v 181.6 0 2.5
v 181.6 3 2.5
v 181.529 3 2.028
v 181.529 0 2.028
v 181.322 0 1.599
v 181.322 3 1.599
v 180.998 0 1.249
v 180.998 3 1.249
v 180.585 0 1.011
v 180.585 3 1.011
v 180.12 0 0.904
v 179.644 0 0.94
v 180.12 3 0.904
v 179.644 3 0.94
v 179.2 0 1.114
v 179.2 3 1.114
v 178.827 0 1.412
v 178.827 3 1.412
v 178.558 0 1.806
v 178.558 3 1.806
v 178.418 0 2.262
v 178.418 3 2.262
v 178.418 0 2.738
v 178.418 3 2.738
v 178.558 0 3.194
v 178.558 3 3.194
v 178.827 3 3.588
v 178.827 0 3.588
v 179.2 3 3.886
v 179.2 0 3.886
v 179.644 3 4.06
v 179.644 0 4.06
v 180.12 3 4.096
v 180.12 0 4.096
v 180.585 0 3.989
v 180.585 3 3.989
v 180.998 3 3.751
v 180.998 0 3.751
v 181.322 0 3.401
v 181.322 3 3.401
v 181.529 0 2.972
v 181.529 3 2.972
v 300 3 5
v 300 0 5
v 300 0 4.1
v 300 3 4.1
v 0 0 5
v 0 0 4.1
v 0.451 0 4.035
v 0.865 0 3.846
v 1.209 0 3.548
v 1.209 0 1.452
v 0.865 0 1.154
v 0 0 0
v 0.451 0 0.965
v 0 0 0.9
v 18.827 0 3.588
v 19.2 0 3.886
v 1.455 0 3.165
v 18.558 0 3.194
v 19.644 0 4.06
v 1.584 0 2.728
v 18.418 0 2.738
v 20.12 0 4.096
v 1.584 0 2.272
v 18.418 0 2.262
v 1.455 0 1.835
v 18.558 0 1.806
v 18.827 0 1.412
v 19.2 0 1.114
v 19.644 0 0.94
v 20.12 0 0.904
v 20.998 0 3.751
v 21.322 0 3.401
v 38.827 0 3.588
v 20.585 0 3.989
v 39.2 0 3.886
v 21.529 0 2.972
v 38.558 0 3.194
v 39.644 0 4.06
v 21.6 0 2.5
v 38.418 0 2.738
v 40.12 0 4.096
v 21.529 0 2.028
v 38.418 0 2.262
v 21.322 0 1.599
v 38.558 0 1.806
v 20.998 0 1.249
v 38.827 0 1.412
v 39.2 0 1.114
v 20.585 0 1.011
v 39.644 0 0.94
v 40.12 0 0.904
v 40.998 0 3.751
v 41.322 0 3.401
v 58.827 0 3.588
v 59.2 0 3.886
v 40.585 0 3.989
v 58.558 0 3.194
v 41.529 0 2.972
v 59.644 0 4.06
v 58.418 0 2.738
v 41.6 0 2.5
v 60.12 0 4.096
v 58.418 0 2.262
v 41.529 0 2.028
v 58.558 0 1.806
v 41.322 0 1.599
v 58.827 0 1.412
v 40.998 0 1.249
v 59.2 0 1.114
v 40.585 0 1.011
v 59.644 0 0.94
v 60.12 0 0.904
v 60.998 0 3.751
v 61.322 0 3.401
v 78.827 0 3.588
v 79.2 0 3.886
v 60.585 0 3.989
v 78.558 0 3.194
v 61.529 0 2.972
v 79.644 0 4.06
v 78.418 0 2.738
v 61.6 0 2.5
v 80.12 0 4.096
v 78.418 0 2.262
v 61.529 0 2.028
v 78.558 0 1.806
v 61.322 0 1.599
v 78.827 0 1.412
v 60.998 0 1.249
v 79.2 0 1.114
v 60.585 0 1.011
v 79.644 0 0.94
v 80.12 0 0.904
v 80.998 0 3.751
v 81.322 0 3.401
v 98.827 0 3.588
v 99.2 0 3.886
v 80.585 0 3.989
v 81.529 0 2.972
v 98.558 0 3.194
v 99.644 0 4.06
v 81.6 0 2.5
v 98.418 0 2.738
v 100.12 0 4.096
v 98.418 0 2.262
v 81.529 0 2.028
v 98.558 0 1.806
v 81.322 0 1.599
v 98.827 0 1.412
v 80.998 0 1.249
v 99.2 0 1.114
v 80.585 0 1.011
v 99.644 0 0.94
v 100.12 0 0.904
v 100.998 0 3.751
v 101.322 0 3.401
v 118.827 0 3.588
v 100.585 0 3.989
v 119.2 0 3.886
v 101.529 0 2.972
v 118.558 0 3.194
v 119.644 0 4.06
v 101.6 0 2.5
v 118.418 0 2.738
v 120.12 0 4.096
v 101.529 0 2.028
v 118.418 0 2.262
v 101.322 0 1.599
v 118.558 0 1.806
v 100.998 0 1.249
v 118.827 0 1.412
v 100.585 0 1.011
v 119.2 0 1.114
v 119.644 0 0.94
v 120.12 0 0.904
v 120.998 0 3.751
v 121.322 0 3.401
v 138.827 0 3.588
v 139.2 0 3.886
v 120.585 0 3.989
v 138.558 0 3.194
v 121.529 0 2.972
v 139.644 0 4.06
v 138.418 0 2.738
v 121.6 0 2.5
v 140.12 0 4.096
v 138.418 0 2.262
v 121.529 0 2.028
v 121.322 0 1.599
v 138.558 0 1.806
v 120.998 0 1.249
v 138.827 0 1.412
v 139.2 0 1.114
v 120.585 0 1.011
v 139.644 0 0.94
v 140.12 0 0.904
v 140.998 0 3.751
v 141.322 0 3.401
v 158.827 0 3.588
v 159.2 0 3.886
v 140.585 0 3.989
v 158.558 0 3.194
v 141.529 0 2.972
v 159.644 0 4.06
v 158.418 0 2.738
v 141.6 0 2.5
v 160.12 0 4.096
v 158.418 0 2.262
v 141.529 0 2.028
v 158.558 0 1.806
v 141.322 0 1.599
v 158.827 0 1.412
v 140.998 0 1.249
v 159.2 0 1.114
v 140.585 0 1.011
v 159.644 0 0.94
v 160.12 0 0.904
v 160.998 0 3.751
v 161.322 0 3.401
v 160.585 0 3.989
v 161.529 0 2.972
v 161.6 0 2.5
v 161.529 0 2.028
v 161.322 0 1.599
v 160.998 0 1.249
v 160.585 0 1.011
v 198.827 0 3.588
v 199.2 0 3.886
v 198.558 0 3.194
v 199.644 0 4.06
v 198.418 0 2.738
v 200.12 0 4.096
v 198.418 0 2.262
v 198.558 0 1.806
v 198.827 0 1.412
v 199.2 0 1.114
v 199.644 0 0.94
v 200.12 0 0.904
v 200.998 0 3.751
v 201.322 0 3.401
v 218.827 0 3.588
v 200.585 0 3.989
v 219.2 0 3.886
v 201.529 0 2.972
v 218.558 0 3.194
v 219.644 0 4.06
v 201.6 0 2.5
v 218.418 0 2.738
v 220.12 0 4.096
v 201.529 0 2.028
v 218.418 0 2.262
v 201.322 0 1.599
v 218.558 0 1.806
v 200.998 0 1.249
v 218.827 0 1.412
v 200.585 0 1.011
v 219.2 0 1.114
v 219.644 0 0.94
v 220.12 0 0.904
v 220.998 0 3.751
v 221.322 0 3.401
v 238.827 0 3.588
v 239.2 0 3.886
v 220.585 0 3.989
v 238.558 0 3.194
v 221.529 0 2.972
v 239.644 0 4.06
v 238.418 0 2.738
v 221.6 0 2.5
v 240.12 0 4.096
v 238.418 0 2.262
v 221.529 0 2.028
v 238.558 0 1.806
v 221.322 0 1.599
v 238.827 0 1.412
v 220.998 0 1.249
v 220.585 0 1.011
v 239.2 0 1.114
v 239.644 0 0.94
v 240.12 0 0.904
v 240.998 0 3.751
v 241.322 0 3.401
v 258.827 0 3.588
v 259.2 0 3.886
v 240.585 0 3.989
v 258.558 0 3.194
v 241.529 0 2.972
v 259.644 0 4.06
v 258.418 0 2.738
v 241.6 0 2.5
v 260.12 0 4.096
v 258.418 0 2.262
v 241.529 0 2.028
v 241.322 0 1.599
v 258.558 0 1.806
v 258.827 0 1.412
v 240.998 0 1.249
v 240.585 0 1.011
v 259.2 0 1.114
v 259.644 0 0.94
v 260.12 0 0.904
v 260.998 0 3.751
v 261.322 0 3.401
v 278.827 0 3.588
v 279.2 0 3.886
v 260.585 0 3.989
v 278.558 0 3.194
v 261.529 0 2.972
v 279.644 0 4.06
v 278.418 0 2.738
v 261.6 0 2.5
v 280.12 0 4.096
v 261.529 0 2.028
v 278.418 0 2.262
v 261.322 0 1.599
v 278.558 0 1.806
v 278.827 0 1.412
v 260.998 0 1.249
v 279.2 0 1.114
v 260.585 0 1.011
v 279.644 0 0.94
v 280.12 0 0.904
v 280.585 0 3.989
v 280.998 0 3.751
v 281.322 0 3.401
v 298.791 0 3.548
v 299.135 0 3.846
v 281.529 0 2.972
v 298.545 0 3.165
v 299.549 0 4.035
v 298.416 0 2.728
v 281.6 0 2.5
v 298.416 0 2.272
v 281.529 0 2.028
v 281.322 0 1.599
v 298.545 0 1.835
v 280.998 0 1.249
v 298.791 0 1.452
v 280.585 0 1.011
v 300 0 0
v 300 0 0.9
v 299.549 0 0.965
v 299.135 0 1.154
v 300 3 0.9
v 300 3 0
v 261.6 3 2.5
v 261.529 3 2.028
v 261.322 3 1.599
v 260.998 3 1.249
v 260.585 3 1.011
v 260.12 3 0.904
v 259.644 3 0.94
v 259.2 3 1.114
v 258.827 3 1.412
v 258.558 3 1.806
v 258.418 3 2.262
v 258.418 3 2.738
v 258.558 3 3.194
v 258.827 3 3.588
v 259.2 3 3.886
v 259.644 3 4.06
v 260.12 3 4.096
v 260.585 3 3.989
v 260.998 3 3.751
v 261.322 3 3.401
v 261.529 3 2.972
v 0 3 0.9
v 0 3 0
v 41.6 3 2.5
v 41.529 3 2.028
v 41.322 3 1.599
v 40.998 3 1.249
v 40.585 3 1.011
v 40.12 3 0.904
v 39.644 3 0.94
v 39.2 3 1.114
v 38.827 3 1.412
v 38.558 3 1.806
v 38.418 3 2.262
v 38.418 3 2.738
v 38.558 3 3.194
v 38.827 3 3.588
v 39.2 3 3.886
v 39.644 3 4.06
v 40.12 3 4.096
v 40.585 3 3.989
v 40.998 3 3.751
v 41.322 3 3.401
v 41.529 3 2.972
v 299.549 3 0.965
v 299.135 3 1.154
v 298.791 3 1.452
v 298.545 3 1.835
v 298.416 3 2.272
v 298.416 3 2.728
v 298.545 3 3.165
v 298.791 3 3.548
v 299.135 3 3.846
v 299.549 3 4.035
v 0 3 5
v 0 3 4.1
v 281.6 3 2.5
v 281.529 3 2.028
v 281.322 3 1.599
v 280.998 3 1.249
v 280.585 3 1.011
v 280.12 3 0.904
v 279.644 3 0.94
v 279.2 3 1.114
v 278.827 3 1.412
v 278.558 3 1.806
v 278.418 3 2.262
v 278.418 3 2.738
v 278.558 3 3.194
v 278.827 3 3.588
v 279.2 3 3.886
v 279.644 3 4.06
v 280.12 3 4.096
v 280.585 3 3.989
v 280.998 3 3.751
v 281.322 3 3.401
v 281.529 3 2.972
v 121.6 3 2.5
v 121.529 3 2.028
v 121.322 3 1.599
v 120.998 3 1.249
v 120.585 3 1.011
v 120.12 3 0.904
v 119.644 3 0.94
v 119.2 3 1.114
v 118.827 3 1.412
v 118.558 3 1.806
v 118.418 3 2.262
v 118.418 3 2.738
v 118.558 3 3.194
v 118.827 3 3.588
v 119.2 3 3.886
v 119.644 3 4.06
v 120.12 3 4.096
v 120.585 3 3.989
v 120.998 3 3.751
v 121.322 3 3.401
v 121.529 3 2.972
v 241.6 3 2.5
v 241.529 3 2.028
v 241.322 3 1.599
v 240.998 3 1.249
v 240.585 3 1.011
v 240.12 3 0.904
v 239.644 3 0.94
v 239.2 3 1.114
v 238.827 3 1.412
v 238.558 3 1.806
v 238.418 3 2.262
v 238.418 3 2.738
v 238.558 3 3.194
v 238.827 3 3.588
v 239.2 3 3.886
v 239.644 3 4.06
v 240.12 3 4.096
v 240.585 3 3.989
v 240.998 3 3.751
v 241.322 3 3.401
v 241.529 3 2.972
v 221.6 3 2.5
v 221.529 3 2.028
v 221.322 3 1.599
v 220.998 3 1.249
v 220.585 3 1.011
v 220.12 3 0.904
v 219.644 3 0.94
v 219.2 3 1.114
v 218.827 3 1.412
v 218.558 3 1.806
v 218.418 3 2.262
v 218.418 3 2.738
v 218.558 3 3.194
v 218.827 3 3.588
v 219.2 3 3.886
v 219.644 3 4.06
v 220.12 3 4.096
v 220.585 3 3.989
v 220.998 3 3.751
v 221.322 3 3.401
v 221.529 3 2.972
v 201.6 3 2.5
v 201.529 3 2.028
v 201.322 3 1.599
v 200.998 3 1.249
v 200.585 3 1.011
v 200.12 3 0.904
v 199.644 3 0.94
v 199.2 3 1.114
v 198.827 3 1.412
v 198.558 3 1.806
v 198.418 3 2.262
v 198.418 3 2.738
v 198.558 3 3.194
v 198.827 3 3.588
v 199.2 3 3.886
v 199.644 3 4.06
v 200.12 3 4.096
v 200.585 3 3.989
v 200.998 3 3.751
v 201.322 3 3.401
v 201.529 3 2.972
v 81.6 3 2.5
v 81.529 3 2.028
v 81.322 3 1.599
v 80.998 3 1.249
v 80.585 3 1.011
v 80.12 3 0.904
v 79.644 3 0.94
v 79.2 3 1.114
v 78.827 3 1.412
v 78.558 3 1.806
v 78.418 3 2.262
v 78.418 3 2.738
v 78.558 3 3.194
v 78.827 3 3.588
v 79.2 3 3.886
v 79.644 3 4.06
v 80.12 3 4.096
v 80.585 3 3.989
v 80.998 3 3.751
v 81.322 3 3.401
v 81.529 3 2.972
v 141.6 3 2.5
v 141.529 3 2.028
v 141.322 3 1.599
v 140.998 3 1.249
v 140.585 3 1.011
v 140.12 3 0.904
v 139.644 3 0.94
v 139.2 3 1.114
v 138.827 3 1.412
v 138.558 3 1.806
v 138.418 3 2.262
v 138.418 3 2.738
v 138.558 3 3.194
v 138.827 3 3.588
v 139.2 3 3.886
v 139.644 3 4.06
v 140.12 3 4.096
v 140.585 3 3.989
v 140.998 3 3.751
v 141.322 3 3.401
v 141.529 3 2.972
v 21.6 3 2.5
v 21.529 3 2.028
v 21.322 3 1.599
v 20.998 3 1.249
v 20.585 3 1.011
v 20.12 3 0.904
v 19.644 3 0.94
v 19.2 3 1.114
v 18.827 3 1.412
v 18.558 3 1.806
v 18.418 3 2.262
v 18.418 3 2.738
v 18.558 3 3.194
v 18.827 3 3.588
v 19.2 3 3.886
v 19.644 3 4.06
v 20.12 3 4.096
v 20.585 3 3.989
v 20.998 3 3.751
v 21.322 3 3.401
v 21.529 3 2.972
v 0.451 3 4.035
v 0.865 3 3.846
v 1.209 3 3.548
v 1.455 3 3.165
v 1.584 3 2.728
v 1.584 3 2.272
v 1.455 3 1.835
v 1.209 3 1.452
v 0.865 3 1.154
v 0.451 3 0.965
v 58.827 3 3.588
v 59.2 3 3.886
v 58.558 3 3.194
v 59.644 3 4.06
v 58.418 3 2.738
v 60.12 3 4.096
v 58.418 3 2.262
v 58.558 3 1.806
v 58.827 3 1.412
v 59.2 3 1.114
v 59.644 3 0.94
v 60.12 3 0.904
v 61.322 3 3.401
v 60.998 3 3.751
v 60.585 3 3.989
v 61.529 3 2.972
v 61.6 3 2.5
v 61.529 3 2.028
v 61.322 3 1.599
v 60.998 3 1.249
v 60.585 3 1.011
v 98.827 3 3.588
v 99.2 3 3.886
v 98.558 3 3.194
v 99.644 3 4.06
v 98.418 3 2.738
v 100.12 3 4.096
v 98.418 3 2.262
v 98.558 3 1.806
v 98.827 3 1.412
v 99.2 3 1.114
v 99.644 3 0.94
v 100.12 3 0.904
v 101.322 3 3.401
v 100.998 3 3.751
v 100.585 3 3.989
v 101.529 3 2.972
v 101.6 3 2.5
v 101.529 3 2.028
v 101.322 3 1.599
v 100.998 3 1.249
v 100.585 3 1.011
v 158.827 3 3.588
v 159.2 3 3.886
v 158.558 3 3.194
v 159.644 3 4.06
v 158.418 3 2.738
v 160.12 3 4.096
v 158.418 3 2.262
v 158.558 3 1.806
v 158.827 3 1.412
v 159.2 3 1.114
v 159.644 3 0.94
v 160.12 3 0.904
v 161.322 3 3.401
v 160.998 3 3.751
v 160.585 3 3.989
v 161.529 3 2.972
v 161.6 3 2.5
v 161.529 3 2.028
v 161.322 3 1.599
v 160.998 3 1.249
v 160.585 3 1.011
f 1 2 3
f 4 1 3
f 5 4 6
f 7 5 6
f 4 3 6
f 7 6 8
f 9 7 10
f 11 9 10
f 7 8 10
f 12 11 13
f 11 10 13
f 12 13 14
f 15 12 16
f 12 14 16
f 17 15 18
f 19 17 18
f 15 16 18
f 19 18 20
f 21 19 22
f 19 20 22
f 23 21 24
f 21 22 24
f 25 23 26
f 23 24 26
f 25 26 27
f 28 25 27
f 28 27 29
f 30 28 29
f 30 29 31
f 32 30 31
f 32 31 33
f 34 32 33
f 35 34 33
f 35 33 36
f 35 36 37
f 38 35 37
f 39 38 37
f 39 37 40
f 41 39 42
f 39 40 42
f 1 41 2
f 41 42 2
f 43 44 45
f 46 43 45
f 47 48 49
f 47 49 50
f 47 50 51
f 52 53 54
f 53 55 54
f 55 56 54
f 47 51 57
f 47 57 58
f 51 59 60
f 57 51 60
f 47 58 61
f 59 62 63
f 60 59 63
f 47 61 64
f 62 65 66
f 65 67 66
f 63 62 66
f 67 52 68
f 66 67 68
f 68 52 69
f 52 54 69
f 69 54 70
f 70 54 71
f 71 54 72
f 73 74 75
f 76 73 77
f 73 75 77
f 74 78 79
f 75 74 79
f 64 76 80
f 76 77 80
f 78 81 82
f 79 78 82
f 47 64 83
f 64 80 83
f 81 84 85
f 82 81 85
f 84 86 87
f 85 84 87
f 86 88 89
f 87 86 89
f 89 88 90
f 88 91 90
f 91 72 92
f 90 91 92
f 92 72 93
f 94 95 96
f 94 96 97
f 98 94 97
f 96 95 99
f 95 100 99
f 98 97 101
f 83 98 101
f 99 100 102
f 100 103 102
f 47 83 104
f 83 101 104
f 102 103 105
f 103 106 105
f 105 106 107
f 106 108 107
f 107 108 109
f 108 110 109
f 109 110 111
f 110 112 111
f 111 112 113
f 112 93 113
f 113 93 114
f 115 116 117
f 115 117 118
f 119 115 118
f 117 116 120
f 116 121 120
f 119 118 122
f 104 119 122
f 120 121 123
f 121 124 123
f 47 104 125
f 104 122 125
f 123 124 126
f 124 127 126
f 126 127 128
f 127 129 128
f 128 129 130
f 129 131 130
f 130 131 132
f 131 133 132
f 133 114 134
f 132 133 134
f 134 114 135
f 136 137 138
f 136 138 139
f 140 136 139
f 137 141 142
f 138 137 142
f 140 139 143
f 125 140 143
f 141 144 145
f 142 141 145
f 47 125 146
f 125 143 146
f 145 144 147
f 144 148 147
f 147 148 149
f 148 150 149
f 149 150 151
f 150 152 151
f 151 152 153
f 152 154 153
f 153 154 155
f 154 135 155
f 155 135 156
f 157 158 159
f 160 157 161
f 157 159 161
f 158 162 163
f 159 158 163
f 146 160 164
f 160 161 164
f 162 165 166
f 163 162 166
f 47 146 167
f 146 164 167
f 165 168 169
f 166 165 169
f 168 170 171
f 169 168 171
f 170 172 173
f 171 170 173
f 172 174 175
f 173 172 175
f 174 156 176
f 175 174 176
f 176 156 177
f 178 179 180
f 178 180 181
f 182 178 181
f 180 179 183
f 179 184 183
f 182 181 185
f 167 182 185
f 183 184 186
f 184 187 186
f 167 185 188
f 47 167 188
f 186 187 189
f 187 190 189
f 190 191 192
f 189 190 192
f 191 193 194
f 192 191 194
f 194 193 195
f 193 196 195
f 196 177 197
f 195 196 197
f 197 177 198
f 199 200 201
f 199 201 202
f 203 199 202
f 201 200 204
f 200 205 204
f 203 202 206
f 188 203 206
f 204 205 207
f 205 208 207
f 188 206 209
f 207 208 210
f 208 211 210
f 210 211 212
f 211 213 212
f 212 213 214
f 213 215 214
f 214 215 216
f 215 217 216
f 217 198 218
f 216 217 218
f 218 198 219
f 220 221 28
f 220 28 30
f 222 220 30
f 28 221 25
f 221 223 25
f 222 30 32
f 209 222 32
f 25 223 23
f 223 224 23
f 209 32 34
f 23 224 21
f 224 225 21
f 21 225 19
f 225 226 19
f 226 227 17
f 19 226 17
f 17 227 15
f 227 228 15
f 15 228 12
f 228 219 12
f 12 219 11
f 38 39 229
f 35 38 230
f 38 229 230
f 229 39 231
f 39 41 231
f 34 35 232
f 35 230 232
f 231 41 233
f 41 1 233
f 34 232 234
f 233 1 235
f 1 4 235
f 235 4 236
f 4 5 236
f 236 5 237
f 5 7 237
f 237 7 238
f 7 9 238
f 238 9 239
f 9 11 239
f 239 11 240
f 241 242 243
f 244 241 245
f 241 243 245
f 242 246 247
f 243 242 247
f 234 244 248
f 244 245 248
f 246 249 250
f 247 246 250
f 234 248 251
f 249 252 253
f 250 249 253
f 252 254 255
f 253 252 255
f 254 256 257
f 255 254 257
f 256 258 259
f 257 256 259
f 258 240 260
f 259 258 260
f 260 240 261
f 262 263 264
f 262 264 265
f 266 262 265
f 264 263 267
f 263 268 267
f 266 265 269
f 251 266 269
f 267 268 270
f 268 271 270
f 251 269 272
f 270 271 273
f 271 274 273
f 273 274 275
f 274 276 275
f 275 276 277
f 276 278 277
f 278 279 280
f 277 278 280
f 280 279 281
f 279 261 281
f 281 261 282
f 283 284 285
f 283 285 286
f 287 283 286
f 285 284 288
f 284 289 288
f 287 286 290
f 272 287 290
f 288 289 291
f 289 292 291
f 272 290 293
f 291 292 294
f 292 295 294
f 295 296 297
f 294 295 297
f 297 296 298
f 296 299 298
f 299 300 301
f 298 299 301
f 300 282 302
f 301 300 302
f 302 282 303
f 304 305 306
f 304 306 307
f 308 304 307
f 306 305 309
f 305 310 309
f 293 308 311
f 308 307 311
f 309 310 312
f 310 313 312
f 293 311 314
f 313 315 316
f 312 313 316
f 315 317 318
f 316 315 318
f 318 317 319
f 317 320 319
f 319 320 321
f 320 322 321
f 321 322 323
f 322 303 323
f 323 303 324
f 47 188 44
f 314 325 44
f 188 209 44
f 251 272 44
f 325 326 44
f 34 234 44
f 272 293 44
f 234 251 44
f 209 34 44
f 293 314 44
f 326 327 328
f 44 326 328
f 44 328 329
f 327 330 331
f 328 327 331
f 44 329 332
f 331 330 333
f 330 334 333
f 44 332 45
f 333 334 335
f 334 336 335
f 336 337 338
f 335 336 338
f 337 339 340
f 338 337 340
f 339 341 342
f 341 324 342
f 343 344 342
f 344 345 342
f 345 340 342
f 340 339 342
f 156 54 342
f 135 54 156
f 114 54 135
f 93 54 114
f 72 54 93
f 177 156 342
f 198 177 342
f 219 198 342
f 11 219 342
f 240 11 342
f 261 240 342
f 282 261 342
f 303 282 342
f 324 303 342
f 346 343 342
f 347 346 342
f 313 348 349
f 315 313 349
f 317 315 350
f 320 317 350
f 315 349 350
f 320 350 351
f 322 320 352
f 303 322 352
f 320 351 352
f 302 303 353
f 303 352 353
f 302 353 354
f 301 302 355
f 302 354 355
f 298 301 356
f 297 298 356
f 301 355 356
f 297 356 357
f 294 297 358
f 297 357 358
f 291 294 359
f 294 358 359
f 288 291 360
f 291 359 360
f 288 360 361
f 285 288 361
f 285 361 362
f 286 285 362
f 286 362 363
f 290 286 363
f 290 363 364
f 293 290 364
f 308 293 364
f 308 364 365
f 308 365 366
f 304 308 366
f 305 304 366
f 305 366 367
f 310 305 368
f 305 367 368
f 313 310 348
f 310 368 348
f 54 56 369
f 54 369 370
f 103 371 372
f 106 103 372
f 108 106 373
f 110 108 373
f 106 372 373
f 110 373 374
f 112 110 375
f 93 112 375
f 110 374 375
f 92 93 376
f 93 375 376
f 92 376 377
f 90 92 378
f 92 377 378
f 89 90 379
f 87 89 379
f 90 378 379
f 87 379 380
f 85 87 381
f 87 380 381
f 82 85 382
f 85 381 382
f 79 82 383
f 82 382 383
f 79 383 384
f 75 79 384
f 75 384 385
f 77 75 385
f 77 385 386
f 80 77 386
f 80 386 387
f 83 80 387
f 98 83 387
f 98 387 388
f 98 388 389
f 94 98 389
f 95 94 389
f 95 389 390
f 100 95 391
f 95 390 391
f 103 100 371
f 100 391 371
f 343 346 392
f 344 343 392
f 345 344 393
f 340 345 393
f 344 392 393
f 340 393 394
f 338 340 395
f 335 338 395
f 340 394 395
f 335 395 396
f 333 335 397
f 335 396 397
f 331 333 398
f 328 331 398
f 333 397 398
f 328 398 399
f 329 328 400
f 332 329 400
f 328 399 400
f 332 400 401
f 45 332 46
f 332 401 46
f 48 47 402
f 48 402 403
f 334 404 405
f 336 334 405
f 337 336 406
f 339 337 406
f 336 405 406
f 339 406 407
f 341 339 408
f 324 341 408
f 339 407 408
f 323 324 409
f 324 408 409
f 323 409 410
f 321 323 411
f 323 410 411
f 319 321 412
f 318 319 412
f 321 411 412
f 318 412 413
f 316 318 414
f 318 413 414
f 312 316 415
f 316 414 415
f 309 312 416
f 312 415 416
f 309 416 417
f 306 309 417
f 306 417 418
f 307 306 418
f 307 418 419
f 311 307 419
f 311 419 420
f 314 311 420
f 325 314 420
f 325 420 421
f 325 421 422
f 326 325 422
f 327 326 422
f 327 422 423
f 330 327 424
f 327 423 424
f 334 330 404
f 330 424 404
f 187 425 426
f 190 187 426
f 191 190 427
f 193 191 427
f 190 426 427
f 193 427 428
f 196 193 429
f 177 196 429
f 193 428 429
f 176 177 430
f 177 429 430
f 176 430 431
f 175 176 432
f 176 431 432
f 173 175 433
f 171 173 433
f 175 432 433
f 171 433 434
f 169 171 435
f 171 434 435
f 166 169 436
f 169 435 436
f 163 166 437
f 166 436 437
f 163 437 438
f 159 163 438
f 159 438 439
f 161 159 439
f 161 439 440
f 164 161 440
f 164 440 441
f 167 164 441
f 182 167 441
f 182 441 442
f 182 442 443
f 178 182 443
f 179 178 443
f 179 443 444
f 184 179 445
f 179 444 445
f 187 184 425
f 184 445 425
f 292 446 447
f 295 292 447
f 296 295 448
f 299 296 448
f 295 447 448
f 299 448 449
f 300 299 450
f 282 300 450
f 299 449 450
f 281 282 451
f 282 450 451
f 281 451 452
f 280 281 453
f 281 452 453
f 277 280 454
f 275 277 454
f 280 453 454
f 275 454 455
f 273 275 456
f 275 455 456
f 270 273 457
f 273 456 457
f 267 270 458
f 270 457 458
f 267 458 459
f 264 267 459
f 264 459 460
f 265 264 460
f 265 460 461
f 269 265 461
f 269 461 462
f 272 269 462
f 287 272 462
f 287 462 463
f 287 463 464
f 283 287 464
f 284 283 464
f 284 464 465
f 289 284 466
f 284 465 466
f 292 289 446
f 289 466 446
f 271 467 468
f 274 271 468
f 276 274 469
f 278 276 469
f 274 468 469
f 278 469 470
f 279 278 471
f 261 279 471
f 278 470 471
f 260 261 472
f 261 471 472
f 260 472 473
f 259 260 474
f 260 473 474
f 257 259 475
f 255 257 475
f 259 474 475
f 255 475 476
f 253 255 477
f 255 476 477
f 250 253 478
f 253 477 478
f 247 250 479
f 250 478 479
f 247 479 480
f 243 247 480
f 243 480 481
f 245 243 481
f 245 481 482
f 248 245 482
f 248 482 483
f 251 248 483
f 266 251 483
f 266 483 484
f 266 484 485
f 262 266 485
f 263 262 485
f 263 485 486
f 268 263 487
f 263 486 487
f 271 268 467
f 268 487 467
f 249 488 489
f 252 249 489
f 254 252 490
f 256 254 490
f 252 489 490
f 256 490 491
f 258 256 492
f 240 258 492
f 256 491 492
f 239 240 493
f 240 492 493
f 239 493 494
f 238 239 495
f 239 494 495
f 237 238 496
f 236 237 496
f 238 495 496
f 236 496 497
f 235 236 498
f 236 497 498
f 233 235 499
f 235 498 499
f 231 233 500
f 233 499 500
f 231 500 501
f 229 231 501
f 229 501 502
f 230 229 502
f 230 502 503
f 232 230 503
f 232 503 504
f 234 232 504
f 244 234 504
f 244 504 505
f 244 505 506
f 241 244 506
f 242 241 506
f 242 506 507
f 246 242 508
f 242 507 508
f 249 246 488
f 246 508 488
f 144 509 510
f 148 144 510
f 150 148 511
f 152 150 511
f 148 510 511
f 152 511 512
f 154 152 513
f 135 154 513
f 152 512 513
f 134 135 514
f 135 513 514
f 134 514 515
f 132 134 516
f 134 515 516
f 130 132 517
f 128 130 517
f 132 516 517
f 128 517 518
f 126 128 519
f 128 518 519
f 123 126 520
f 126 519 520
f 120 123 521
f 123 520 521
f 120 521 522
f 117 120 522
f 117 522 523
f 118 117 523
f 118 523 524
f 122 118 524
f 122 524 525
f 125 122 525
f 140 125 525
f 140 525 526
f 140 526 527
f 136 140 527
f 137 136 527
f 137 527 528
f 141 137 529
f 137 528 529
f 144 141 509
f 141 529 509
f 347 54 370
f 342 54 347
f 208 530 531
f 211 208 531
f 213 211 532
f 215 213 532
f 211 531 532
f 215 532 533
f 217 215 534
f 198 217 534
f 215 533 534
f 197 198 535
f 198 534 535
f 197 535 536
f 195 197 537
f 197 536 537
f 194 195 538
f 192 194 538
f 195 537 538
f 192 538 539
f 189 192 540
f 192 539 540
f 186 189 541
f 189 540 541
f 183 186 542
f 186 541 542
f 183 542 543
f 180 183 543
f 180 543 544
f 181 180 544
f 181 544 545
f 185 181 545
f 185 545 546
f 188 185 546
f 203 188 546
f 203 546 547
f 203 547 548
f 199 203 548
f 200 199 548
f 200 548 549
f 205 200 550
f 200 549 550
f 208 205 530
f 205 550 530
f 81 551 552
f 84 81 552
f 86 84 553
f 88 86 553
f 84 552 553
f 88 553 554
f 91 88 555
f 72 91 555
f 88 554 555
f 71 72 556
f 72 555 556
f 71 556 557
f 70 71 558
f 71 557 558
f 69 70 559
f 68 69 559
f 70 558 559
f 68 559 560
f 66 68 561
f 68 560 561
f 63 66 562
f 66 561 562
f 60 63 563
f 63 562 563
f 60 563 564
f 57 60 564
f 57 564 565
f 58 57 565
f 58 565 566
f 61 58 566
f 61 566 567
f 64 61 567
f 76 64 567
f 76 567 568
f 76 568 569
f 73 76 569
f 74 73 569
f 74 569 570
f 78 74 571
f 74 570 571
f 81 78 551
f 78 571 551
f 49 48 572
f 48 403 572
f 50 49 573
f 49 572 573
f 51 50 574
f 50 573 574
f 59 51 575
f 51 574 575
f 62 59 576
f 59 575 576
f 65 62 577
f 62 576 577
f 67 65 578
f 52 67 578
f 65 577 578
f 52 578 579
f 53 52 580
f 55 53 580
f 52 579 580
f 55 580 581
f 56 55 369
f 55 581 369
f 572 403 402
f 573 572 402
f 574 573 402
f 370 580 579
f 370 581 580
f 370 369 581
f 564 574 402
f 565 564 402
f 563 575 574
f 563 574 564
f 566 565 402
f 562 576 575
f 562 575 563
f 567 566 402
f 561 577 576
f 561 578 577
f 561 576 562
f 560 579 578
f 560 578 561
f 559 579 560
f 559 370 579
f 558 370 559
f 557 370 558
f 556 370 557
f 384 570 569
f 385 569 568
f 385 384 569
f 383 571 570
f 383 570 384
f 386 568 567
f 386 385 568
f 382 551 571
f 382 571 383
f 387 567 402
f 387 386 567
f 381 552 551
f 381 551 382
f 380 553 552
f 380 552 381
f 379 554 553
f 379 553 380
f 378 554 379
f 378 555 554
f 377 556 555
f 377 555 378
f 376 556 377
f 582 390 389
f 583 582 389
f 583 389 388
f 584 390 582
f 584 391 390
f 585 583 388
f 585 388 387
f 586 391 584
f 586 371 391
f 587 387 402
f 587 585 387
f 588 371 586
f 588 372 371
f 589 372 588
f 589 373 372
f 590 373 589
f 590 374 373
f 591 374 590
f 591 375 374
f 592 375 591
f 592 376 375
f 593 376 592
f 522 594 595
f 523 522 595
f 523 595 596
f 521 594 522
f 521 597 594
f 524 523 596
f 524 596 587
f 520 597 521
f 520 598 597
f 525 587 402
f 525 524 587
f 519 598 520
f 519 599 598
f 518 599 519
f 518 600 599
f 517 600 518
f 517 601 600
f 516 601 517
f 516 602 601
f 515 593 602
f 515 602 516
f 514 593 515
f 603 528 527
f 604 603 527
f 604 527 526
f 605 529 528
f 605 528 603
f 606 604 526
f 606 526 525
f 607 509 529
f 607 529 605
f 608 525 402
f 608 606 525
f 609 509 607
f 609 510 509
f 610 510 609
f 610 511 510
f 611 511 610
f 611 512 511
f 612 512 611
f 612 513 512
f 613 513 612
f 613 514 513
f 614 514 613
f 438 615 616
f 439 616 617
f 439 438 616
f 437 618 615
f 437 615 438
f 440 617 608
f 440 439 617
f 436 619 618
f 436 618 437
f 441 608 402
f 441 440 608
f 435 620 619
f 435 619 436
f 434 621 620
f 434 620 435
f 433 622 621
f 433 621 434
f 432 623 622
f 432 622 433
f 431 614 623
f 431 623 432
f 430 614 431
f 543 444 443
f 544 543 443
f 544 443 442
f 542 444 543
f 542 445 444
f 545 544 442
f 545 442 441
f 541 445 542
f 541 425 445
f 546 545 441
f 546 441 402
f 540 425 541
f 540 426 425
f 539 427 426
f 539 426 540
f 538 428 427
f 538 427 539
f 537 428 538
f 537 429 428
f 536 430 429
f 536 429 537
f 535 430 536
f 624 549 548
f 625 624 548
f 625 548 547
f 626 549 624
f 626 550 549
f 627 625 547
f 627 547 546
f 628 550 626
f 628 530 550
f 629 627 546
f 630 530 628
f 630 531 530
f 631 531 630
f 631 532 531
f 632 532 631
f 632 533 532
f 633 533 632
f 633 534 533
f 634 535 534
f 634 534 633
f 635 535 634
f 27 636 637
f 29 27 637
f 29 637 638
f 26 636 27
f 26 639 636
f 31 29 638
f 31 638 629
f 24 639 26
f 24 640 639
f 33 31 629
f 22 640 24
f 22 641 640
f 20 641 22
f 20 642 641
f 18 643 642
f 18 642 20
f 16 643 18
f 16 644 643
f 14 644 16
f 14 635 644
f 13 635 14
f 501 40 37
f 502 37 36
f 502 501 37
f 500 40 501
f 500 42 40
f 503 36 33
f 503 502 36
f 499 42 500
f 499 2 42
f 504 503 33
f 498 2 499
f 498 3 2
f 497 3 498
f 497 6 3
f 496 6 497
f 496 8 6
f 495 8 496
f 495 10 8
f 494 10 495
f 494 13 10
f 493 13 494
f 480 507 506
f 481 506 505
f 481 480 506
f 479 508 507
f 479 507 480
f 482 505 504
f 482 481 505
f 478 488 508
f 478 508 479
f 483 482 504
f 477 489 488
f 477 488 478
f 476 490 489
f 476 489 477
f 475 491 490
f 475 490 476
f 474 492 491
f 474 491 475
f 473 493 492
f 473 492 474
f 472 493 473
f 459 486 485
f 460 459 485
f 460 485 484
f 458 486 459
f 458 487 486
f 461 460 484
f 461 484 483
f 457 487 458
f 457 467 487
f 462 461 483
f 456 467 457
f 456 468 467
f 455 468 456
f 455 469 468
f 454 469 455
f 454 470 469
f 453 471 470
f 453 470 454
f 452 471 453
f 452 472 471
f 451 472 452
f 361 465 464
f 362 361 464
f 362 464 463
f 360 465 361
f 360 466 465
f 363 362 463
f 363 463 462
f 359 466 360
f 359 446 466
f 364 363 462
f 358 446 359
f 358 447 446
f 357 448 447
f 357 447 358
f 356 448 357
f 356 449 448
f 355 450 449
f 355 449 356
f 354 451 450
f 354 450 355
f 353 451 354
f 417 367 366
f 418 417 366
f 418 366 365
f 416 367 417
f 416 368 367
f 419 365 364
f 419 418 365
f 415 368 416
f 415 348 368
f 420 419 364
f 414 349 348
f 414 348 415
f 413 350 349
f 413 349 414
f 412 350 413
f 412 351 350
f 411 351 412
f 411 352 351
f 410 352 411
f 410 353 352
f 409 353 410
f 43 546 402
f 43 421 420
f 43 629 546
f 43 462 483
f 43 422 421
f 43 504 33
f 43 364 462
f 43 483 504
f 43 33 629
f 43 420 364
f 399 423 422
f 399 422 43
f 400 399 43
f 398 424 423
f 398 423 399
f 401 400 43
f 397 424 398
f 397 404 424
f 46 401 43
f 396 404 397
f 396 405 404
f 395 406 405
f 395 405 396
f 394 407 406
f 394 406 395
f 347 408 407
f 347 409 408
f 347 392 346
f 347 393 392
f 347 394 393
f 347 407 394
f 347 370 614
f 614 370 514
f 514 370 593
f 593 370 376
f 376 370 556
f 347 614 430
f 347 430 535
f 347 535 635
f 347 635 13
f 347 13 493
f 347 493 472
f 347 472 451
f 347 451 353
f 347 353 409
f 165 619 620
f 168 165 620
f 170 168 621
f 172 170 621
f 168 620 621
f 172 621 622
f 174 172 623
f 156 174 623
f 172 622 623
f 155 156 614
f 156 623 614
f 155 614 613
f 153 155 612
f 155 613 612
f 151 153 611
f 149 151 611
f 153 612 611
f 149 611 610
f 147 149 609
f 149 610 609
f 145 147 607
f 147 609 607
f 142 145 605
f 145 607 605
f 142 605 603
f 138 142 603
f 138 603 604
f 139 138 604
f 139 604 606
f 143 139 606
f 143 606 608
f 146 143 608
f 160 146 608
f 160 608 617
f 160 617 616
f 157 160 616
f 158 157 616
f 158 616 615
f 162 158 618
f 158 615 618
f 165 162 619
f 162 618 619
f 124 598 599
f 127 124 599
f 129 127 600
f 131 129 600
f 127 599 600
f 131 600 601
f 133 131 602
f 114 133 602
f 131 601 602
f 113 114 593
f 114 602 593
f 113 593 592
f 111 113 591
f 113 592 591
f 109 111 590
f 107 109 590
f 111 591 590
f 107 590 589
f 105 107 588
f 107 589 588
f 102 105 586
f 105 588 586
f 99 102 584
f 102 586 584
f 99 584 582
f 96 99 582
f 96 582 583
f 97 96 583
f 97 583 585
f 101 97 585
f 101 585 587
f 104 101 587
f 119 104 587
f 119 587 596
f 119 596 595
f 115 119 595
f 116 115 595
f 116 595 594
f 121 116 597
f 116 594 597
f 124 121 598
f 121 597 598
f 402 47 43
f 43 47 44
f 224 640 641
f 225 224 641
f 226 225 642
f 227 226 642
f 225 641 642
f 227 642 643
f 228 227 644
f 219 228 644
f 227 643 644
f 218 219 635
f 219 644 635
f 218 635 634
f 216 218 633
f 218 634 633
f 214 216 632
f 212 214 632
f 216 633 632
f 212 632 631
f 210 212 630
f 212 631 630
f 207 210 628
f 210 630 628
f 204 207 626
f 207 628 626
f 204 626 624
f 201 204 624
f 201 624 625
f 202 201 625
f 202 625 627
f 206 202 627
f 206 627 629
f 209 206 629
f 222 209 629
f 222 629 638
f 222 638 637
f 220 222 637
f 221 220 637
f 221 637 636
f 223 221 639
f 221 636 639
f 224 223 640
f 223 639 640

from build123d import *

# Parameters (mm, degrees)
SKETCH1_W           = 300
SKETCH1_H           = 5
BOSS_EXTRUDE1_DEPTH = 3
SKETCH2_R           = 1.6
CUT_EXTRUDE1_DEPTH  = 3


with BuildPart() as part:
    # Sketch1 → Boss-Extrude1 (new body)
    with BuildSketch(Plane(origin=(0, 0, 0), x_dir=(1, 0, 0), z_dir=(0, 1, 0))):
        with Locations((150, -2.5)):
            Rectangle(SKETCH1_W, SKETCH1_H)
    extrude(amount=BOSS_EXTRUDE1_DEPTH)

    # Sketch2 → Cut-Extrude1 (cut)
    with BuildSketch(Plane(origin=(0, 3, 0), x_dir=(1, 0, 0), z_dir=(0, 1, 0))):
        with Locations((0, -2.5)):
            Circle(SKETCH2_R)
        with Locations((20, -2.5)):
            Circle(SKETCH2_R)
        with Locations((40, -2.5)):
            Circle(SKETCH2_R)
        with Locations((60, -2.5)):
            Circle(SKETCH2_R)
        with Locations((80, -2.5)):
            Circle(SKETCH2_R)
        with Locations((100, -2.5)):
            Circle(SKETCH2_R)
        with Locations((120, -2.5)):
            Circle(SKETCH2_R)
        with Locations((140, -2.5)):
            Circle(SKETCH2_R)
        with Locations((160, -2.5)):
            Circle(SKETCH2_R)
        with Locations((180, -2.5)):
            Circle(SKETCH2_R)
        with Locations((200, -2.5)):
            Circle(SKETCH2_R)
        with Locations((220, -2.5)):
            Circle(SKETCH2_R)
        with Locations((240, -2.5)):
            Circle(SKETCH2_R)
        with Locations((260, -2.5)):
            Circle(SKETCH2_R)
        with Locations((280, -2.5)):
            Circle(SKETCH2_R)
        with Locations((300, -2.5)):
            Circle(SKETCH2_R)
        with Locations((320, -2.5)):
            Circle(SKETCH2_R)
        with Locations((340, -2.5)):
            Circle(SKETCH2_R)
        with Locations((360, -2.5)):
            Circle(SKETCH2_R)
        with Locations((380, -2.5)):
            Circle(SKETCH2_R)
        with Locations((400, -2.5)):
            Circle(SKETCH2_R)
        with Locations((420, -2.5)):
            Circle(SKETCH2_R)
        with Locations((440, -2.5)):
            Circle(SKETCH2_R)
        with Locations((460, -2.5)):
            Circle(SKETCH2_R)
        with Locations((480, -2.5)):
            Circle(SKETCH2_R)
        with Locations((500, -2.5)):
            Circle(SKETCH2_R)
        with Locations((520, -2.5)):
            Circle(SKETCH2_R)
        with Locations((540, -2.5)):
            Circle(SKETCH2_R)
        with Locations((560, -2.5)):
            Circle(SKETCH2_R)
        with Locations((580, -2.5)):
            Circle(SKETCH2_R)
        with Locations((600, -2.5)):
            Circle(SKETCH2_R)
        with Locations((620, -2.5)):
            Circle(SKETCH2_R)
        with Locations((640, -2.5)):
            Circle(SKETCH2_R)
        with Locations((660, -2.5)):
            Circle(SKETCH2_R)
        with Locations((680, -2.5)):
            Circle(SKETCH2_R)
        with Locations((700, -2.5)):
            Circle(SKETCH2_R)
        with Locations((720, -2.5)):
            Circle(SKETCH2_R)
        with Locations((740, -2.5)):
            Circle(SKETCH2_R)
        with Locations((760, -2.5)):
            Circle(SKETCH2_R)
        with Locations((780, -2.5)):
            Circle(SKETCH2_R)
        with Locations((800, -2.5)):
            Circle(SKETCH2_R)
        with Locations((820, -2.5)):
            Circle(SKETCH2_R)
        with Locations((840, -2.5)):
            Circle(SKETCH2_R)
        with Locations((860, -2.5)):
            Circle(SKETCH2_R)
        with Locations((880, -2.5)):
            Circle(SKETCH2_R)
        with Locations((900, -2.5)):
            Circle(SKETCH2_R)
        with Locations((920, -2.5)):
            Circle(SKETCH2_R)
        with Locations((940, -2.5)):
            Circle(SKETCH2_R)
        with Locations((960, -2.5)):
            Circle(SKETCH2_R)
        with Locations((980, -2.5)):
            Circle(SKETCH2_R)
        with Locations((1000, -2.5)):
            Circle(SKETCH2_R)
        with Locations((1020, -2.5)):
            Circle(SKETCH2_R)
        with Locations((1040, -2.5)):
            Circle(SKETCH2_R)
        with Locations((1060, -2.5)):
            Circle(SKETCH2_R)
        with Locations((1080, -2.5)):
            Circle(SKETCH2_R)
        with Locations((1100, -2.5)):
            Circle(SKETCH2_R)
        with Locations((1120, -2.5)):
            Circle(SKETCH2_R)
        with Locations((1140, -2.5)):
            Circle(SKETCH2_R)
        with Locations((1160, -2.5)):
            Circle(SKETCH2_R)
        with Locations((1180, -2.5)):
            Circle(SKETCH2_R)
        with Locations((1200, -2.5)):
            Circle(SKETCH2_R)
        with Locations((1220, -2.5)):
            Circle(SKETCH2_R)
        with Locations((1240, -2.5)):
            Circle(SKETCH2_R)
        with Locations((1260, -2.5)):
            Circle(SKETCH2_R)
        with Locations((1280, -2.5)):
            Circle(SKETCH2_R)
        with Locations((1300, -2.5)):
            Circle(SKETCH2_R)
        with Locations((1320, -2.5)):
            Circle(SKETCH2_R)
        with Locations((1340, -2.5)):
            Circle(SKETCH2_R)
        with Locations((1360, -2.5)):
            Circle(SKETCH2_R)
        with Locations((1380, -2.5)):
            Circle(SKETCH2_R)
        with Locations((1400, -2.5)):
            Circle(SKETCH2_R)
        with Locations((1420, -2.5)):
            Circle(SKETCH2_R)
        with Locations((1440, -2.5)):
            Circle(SKETCH2_R)
        with Locations((1460, -2.5)):
            Circle(SKETCH2_R)
        with Locations((1480, -2.5)):
            Circle(SKETCH2_R)
        with Locations((1500, -2.5)):
            Circle(SKETCH2_R)
        with Locations((1520, -2.5)):
            Circle(SKETCH2_R)
        with Locations((1540, -2.5)):
            Circle(SKETCH2_R)
        with Locations((1560, -2.5)):
            Circle(SKETCH2_R)
        with Locations((1580, -2.5)):
            Circle(SKETCH2_R)
        with Locations((1600, -2.5)):
            Circle(SKETCH2_R)
        with Locations((1620, -2.5)):
            Circle(SKETCH2_R)
        with Locations((1640, -2.5)):
            Circle(SKETCH2_R)
        with Locations((1660, -2.5)):
            Circle(SKETCH2_R)
        with Locations((1680, -2.5)):
            Circle(SKETCH2_R)
        with Locations((1700, -2.5)):
            Circle(SKETCH2_R)
        with Locations((1720, -2.5)):
            Circle(SKETCH2_R)
        with Locations((1740, -2.5)):
            Circle(SKETCH2_R)
        with Locations((1760, -2.5)):
            Circle(SKETCH2_R)
        with Locations((1780, -2.5)):
            Circle(SKETCH2_R)
        with Locations((1800, -2.5)):
            Circle(SKETCH2_R)
        with Locations((1820, -2.5)):
            Circle(SKETCH2_R)
        with Locations((1840, -2.5)):
            Circle(SKETCH2_R)
        with Locations((1860, -2.5)):
            Circle(SKETCH2_R)
        with Locations((1880, -2.5)):
            Circle(SKETCH2_R)
        with Locations((1900, -2.5)):
            Circle(SKETCH2_R)
        with Locations((1920, -2.5)):
            Circle(SKETCH2_R)
        with Locations((1940, -2.5)):
            Circle(SKETCH2_R)
        with Locations((1960, -2.5)):
            Circle(SKETCH2_R)
        with Locations((1980, -2.5)):
            Circle(SKETCH2_R)
    extrude(amount=-CUT_EXTRUDE1_DEPTH, mode=Mode.SUBTRACT)


solid = part.part
